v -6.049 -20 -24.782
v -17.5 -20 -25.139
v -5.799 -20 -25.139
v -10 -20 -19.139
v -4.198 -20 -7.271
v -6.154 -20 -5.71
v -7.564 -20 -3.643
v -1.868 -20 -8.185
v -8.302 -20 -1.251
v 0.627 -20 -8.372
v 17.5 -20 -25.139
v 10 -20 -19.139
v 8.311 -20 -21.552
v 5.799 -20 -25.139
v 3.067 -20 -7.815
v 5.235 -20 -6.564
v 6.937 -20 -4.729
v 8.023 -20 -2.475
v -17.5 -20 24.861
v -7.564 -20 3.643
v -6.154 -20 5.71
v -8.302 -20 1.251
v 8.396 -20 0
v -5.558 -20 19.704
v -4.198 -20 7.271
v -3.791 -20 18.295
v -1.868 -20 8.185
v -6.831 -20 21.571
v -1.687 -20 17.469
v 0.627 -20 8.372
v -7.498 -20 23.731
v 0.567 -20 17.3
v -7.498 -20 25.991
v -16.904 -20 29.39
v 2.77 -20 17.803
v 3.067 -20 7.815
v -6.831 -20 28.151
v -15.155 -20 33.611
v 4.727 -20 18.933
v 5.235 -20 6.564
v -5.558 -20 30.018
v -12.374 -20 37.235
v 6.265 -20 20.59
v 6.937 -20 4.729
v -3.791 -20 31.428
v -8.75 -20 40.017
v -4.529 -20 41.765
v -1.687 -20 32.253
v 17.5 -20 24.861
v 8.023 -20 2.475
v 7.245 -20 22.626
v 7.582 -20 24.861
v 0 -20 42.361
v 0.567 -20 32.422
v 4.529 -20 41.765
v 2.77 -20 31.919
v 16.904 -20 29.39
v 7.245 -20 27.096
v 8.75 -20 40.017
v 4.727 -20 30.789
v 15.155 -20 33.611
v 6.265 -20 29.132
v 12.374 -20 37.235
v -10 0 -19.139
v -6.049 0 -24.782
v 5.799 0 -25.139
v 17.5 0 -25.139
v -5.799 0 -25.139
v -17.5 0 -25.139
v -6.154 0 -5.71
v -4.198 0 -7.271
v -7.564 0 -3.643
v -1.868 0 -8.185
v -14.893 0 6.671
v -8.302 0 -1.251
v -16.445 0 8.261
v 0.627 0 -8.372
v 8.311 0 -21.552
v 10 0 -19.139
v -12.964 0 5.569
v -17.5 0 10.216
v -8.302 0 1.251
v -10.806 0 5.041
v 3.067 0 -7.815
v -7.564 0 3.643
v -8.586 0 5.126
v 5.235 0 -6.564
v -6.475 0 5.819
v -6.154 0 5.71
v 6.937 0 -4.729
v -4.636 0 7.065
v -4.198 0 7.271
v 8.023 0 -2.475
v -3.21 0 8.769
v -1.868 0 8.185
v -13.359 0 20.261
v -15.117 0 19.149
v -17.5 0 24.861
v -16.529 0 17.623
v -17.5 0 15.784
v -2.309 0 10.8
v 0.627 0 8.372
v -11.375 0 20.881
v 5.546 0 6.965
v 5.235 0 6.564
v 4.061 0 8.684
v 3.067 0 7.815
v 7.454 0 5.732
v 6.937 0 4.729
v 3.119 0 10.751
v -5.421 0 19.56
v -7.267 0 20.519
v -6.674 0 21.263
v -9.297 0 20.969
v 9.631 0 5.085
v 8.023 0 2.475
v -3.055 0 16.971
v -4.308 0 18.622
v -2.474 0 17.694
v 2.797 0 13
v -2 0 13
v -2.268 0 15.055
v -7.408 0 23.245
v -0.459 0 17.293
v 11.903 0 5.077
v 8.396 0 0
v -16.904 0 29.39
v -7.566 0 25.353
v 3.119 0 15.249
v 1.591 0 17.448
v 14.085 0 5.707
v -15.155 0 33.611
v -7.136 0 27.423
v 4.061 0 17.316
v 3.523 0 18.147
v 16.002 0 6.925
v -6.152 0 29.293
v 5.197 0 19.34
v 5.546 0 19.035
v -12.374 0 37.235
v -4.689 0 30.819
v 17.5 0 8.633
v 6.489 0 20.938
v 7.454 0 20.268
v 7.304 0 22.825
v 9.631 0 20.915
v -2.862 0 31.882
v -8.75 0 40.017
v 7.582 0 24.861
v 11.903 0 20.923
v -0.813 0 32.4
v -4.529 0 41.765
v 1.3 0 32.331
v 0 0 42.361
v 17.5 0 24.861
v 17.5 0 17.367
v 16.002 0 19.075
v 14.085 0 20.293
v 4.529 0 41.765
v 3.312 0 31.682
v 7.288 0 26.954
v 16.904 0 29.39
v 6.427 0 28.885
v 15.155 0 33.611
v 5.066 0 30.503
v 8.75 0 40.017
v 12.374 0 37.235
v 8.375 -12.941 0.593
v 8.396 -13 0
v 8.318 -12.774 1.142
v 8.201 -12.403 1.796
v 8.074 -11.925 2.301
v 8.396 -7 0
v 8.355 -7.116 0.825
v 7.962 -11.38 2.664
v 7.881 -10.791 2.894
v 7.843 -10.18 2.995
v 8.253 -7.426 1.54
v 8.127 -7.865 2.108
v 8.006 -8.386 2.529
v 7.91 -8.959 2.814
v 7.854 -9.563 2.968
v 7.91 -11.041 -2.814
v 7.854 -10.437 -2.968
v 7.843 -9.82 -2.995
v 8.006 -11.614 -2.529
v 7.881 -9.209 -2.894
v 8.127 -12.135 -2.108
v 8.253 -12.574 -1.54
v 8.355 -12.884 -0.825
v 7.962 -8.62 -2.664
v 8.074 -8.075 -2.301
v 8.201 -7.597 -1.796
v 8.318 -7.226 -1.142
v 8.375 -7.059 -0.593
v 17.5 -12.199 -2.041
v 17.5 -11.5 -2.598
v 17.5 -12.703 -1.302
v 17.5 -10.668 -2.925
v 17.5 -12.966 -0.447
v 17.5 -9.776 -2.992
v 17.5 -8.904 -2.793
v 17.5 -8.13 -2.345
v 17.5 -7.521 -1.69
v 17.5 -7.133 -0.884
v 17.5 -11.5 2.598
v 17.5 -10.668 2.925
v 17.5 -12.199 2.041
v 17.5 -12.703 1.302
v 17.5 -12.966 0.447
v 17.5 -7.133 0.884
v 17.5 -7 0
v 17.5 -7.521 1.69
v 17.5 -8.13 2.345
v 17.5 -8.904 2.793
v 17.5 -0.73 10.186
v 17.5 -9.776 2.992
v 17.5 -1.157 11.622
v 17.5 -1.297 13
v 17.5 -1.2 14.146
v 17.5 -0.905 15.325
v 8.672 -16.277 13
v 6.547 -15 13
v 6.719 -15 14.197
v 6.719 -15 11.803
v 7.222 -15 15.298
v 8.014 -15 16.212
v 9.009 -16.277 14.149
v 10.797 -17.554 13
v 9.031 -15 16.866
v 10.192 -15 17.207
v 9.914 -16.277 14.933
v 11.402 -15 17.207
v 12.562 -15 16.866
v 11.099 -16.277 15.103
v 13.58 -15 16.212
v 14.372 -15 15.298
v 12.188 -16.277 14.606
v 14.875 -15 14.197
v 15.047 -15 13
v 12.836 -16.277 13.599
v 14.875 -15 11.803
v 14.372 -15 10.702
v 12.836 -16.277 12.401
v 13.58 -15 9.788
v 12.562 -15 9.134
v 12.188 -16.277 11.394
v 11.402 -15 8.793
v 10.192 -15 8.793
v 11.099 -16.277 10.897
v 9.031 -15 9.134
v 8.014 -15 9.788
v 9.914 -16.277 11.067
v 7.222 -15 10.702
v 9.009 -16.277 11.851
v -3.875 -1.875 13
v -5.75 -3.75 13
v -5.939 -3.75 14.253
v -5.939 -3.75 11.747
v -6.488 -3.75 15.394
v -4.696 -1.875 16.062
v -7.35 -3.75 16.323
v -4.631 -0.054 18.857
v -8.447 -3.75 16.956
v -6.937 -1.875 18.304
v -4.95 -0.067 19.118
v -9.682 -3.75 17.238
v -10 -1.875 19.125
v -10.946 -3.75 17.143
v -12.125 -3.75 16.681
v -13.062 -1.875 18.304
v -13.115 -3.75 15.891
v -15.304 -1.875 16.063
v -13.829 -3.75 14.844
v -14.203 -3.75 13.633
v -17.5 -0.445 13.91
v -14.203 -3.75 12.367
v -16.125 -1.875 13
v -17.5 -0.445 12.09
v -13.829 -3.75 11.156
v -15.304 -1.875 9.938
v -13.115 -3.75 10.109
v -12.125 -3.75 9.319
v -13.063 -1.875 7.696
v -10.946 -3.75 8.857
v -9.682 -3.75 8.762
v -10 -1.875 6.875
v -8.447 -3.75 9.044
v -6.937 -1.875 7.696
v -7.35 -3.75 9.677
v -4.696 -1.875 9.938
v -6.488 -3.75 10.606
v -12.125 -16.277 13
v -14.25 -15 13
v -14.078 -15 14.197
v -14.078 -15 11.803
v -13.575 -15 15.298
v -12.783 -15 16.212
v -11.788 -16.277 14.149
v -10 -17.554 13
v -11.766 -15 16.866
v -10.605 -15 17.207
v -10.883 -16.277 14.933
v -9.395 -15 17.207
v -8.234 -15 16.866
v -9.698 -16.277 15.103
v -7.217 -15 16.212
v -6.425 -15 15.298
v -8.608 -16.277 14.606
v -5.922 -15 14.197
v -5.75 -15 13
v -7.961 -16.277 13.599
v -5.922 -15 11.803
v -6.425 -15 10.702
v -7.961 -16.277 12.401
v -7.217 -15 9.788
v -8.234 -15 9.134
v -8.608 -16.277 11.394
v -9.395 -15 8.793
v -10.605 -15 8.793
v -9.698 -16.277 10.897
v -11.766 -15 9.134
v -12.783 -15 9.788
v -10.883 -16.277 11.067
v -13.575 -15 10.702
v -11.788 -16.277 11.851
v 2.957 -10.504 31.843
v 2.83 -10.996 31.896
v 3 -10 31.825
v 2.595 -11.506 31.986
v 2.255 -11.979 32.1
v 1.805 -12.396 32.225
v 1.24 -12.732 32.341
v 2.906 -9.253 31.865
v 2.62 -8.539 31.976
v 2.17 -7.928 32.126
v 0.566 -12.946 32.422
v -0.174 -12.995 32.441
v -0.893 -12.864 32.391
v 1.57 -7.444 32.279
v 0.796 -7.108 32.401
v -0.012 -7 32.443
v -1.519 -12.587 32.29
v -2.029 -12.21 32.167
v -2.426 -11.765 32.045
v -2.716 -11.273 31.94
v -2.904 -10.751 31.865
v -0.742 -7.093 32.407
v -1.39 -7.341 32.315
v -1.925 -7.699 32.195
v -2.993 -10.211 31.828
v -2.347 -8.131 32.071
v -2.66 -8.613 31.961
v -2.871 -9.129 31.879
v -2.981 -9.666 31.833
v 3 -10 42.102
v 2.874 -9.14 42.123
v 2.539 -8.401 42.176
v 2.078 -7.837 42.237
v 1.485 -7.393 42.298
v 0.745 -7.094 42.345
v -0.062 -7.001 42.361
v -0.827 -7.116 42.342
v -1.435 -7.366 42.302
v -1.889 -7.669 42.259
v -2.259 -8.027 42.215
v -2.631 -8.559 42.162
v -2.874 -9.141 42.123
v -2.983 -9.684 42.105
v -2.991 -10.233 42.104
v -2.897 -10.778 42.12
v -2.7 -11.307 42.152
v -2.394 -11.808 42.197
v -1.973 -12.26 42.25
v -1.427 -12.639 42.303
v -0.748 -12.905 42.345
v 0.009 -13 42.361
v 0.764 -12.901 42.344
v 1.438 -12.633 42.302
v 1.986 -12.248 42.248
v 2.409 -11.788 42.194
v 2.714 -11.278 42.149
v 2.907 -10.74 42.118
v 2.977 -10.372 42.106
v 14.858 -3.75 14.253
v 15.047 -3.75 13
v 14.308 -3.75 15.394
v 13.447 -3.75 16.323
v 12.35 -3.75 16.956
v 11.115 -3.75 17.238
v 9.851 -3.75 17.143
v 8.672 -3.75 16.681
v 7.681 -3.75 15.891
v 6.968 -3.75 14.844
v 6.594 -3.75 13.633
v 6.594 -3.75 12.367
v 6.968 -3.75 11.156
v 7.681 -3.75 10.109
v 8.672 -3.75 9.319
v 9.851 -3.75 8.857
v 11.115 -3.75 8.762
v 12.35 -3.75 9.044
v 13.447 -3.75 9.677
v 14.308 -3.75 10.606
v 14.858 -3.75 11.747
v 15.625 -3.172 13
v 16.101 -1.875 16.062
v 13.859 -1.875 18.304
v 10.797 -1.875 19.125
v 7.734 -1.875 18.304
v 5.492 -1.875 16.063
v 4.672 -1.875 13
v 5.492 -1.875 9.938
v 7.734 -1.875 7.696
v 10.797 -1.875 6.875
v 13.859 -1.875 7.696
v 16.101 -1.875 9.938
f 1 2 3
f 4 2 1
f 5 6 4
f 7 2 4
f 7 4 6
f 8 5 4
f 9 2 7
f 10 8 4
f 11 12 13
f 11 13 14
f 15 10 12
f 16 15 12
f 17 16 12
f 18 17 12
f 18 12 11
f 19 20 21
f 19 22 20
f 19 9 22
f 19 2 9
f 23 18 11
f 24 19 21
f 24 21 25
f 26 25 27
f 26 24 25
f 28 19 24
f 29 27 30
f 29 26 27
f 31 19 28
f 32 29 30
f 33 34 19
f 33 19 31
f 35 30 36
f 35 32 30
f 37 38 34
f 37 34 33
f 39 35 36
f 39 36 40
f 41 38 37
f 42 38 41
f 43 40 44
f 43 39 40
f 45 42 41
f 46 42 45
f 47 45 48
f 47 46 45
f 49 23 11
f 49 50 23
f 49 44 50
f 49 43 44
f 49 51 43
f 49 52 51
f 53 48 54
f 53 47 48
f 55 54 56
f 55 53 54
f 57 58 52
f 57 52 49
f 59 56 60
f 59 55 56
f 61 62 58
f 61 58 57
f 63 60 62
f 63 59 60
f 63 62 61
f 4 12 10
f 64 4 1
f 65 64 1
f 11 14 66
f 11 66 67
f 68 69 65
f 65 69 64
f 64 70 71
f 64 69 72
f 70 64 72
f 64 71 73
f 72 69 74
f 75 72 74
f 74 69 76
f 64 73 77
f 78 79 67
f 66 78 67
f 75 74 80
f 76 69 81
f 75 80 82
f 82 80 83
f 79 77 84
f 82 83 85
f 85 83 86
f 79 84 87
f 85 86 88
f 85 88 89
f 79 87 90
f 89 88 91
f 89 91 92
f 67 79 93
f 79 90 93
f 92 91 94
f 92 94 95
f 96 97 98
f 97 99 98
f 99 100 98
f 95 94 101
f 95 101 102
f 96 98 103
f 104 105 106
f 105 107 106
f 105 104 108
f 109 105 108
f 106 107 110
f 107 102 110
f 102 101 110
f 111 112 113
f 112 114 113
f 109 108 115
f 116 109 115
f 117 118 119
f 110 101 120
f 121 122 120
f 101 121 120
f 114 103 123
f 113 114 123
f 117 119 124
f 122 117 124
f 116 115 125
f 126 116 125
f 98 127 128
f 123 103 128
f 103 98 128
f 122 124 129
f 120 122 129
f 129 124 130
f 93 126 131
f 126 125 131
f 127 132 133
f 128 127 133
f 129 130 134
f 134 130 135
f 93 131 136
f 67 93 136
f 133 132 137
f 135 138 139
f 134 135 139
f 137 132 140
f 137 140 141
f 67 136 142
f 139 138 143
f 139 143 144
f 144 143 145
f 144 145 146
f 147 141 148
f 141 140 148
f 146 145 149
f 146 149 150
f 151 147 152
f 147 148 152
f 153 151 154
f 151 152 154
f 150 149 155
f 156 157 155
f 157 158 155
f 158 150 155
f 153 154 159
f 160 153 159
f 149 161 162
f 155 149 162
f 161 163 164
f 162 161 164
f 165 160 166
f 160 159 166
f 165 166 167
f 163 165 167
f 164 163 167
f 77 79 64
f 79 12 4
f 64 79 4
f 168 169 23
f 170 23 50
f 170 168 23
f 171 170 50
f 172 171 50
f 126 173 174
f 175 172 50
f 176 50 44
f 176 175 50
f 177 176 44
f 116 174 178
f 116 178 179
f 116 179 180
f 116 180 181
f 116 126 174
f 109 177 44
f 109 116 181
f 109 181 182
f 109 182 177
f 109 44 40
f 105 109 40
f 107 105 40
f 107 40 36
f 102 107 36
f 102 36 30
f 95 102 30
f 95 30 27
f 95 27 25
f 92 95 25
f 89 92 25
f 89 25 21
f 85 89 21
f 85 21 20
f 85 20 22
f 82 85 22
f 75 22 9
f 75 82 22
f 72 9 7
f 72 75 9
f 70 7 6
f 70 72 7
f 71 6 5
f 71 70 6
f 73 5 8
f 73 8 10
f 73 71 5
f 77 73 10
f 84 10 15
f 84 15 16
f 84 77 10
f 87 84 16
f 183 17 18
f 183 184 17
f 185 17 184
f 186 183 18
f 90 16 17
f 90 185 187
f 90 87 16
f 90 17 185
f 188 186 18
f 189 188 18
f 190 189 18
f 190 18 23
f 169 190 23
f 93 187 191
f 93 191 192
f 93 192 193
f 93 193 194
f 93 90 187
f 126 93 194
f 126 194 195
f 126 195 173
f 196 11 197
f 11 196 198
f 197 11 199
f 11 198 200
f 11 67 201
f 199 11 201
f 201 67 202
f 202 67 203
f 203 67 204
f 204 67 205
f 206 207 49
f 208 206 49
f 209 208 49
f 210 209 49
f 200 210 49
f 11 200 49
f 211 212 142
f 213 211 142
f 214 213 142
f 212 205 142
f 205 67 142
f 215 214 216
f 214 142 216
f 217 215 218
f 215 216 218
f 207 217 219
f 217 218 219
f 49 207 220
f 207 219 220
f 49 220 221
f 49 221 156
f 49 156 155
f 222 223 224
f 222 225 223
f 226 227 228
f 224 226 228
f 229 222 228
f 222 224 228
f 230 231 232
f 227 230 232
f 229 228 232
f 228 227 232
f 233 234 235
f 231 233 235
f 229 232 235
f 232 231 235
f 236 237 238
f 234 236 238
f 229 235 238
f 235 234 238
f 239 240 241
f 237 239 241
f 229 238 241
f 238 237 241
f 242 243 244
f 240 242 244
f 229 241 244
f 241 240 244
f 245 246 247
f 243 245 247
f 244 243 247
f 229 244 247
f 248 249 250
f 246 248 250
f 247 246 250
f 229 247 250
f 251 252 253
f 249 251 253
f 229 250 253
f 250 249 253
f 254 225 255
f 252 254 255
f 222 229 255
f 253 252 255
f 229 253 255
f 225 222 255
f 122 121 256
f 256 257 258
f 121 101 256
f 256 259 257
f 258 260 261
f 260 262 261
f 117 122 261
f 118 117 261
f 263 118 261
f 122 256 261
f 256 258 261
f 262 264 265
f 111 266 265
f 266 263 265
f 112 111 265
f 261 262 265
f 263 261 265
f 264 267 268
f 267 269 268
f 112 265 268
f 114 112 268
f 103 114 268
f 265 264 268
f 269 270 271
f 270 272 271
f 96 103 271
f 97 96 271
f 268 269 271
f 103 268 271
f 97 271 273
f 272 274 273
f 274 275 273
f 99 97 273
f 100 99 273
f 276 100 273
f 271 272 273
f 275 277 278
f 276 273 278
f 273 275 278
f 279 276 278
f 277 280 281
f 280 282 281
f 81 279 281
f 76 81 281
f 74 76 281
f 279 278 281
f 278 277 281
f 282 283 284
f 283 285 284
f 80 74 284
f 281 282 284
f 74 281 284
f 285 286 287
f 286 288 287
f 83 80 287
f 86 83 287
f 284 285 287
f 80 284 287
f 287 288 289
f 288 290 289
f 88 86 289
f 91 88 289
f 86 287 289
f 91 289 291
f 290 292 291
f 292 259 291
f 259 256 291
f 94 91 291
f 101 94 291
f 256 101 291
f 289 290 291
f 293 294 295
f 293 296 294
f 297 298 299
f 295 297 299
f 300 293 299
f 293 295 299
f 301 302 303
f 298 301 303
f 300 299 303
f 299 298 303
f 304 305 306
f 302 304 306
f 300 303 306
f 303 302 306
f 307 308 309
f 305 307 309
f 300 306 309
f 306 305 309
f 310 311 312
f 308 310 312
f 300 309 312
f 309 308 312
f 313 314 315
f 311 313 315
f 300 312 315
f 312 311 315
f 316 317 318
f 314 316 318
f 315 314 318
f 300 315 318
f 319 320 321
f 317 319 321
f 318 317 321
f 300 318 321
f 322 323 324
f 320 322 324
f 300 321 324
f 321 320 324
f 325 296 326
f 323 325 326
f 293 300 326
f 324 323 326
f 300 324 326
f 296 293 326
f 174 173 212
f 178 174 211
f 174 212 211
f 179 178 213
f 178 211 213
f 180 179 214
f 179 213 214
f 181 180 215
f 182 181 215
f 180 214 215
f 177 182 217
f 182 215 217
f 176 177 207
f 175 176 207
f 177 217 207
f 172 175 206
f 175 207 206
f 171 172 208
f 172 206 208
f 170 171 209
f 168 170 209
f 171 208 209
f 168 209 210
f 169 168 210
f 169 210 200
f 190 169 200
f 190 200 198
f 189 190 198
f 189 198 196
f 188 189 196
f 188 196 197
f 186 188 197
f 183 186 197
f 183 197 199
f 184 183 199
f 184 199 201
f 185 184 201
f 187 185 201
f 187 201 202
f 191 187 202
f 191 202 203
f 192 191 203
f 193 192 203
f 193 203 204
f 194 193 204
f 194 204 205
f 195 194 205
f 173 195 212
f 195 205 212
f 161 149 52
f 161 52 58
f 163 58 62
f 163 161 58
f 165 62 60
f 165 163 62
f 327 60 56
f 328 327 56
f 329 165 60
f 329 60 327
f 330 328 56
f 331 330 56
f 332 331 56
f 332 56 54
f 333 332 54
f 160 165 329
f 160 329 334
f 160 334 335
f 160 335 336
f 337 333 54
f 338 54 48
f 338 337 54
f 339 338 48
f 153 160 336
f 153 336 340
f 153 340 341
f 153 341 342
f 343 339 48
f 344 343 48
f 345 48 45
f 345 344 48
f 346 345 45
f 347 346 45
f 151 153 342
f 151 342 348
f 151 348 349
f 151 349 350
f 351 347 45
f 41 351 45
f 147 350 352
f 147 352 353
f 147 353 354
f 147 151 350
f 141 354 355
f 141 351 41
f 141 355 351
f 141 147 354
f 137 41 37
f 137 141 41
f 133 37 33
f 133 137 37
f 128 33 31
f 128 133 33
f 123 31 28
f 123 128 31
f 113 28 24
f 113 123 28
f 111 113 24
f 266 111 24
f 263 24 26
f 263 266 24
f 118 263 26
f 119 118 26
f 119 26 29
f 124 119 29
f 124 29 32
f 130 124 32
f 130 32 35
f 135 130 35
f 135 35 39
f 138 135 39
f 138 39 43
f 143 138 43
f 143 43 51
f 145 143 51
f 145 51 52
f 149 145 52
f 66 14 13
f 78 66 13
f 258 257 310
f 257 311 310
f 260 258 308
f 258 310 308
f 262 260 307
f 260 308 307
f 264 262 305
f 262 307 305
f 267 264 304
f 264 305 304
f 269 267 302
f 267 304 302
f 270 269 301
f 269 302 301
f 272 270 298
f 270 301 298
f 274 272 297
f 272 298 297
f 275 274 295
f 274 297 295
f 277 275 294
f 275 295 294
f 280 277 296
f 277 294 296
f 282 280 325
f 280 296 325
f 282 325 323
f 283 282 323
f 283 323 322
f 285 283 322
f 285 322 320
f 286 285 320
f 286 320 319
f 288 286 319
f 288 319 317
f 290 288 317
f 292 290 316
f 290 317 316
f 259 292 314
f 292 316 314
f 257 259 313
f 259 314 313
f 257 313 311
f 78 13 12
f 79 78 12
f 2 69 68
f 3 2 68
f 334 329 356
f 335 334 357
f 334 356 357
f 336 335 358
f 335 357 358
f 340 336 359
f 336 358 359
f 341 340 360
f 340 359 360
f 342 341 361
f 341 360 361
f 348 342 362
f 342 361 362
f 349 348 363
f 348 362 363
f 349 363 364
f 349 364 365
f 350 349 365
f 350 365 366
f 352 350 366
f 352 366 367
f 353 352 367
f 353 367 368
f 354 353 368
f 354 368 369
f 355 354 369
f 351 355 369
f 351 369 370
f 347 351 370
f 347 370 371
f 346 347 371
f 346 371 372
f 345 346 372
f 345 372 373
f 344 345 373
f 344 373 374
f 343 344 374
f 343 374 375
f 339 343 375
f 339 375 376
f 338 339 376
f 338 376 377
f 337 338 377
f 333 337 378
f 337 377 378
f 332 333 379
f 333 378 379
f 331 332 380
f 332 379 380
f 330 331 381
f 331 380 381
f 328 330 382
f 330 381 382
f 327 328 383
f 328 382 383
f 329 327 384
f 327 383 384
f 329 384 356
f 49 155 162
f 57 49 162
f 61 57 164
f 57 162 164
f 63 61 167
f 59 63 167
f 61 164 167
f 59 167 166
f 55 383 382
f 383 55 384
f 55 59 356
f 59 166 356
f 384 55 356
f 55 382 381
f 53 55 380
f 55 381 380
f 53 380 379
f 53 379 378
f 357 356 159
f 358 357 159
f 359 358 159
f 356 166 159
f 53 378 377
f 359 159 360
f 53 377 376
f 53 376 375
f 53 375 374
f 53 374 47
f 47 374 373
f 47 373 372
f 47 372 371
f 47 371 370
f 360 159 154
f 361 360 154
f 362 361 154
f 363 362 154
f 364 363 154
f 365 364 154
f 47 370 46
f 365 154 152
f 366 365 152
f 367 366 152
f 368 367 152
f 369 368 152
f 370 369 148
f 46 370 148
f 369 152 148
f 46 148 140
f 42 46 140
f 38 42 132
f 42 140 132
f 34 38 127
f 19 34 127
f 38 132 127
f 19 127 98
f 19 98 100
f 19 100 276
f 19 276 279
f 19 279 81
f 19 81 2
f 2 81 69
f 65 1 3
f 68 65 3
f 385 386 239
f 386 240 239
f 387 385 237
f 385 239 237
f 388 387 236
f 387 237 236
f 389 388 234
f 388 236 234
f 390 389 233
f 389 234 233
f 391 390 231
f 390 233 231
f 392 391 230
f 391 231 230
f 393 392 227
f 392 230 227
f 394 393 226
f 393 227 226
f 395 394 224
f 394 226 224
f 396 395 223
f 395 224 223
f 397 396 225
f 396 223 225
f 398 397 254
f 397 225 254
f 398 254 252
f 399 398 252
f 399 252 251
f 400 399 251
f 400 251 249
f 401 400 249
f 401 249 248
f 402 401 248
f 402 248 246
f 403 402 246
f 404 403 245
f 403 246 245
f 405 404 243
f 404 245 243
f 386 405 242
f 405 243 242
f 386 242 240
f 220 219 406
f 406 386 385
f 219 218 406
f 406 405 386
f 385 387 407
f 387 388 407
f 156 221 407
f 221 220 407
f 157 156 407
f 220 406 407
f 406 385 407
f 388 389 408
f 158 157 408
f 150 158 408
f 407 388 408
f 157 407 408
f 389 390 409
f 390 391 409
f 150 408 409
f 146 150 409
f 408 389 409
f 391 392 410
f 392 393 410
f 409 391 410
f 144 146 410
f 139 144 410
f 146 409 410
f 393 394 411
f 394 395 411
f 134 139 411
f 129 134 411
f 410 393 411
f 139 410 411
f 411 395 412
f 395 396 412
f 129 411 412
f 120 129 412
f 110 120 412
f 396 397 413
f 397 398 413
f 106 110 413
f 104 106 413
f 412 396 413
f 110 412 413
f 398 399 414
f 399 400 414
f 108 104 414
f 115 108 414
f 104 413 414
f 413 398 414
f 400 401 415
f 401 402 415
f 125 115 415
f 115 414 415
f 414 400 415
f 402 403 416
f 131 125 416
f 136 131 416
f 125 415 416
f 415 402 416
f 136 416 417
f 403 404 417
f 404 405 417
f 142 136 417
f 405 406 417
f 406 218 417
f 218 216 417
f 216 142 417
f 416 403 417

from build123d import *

# Parameters (mm, degrees)
F0_R            = 8.3956500105
F0_R_2          = 7.5822661832
F1_DEPTH        = 20
F4_DEPTH        = 25
F5_R            = 3
F6_DEPTH        = 10
F8_R            = 3
F9_DEPTH        = 40
F11_D           = 8.5
F11_DEPTH       = 15
F11_CSINK_D     = 16
F11_CSINK_ANGLE = 90
F11_TIP         = 2.5536576309


with BuildPart() as f1:
    # F0 (on Front) → F1 (new body)
    with BuildSketch(Plane.XZ):
        with BuildLine():
            Line((-17.5, 24.8610879062), (-17.5, -25.1389120938))
            Line((-17.5, -25.1389120938), (17.5, -25.1389120938))
            Line((17.5, -25.1389120938), (17.5, 24.8610879062))
            ThreePointArc((17.5, 24.8610879062), (0, 42.3610879062), (-17.5, 24.8610879062))
        make_face()
        Circle(F0_R, mode=Mode.SUBTRACT)
        with Locations((0, 24.8610879062)):
            Circle(F0_R_2, mode=Mode.SUBTRACT)
    extrude(amount=F1_DEPTH)

    # F3 (on face) → F4 (cut)
    with BuildSketch(Plane.XZ.offset(20)):
        Polygon((-10, -19.1389120938), (-6.0486232505, -24.7820629224), (8.8115125525, -19.1389120938), align=None)
        Polygon((-6.0486232505, -24.7820629224), (-5.7255781316, -25.2434191651), (5.7496010901, -25.2091108247), (8.3105433405, -21.5517062546), (8.9213285707, -19.1389120938), (8.8115125525, -19.1389120938), align=None)
        Polygon((8.9213285707, -19.1389120938), (8.3105433405, -21.5517062546), (10, -19.1389120938), align=None)
    extrude(amount=-F4_DEPTH, mode=Mode.SUBTRACT)

    # F5 (on face) → F6 (cut)
    with BuildSketch(Plane.YZ.offset(17.5)):
        with Locations((-10, 0)):
            Circle(F5_R)
    extrude(amount=-F6_DEPTH, mode=Mode.SUBTRACT)

    # F8 (on offset) → F9 (cut)
    with BuildSketch(Plane.XY.offset(67.5)):
        with Locations((0, -10)):
            Circle(F8_R)
    extrude(amount=-F9_DEPTH, mode=Mode.SUBTRACT)

    # F11
    with Locations(Plane(origin=(0, 0, 0), x_dir=(-1, 0, 0), z_dir=(0, 1, 0))):
        with Locations((10, 13), (-10.7969033529, 13)):
            CounterSinkHole(F11_D / 2, F11_CSINK_D / 2, depth=F11_DEPTH, counter_sink_angle=F11_CSINK_ANGLE)
            with Locations((0, 0, -(F11_DEPTH + F11_TIP / 2))):  # 118° drill point
                Cone(0, F11_D / 2, F11_TIP, mode=Mode.SUBTRACT)


solid = f1.part
